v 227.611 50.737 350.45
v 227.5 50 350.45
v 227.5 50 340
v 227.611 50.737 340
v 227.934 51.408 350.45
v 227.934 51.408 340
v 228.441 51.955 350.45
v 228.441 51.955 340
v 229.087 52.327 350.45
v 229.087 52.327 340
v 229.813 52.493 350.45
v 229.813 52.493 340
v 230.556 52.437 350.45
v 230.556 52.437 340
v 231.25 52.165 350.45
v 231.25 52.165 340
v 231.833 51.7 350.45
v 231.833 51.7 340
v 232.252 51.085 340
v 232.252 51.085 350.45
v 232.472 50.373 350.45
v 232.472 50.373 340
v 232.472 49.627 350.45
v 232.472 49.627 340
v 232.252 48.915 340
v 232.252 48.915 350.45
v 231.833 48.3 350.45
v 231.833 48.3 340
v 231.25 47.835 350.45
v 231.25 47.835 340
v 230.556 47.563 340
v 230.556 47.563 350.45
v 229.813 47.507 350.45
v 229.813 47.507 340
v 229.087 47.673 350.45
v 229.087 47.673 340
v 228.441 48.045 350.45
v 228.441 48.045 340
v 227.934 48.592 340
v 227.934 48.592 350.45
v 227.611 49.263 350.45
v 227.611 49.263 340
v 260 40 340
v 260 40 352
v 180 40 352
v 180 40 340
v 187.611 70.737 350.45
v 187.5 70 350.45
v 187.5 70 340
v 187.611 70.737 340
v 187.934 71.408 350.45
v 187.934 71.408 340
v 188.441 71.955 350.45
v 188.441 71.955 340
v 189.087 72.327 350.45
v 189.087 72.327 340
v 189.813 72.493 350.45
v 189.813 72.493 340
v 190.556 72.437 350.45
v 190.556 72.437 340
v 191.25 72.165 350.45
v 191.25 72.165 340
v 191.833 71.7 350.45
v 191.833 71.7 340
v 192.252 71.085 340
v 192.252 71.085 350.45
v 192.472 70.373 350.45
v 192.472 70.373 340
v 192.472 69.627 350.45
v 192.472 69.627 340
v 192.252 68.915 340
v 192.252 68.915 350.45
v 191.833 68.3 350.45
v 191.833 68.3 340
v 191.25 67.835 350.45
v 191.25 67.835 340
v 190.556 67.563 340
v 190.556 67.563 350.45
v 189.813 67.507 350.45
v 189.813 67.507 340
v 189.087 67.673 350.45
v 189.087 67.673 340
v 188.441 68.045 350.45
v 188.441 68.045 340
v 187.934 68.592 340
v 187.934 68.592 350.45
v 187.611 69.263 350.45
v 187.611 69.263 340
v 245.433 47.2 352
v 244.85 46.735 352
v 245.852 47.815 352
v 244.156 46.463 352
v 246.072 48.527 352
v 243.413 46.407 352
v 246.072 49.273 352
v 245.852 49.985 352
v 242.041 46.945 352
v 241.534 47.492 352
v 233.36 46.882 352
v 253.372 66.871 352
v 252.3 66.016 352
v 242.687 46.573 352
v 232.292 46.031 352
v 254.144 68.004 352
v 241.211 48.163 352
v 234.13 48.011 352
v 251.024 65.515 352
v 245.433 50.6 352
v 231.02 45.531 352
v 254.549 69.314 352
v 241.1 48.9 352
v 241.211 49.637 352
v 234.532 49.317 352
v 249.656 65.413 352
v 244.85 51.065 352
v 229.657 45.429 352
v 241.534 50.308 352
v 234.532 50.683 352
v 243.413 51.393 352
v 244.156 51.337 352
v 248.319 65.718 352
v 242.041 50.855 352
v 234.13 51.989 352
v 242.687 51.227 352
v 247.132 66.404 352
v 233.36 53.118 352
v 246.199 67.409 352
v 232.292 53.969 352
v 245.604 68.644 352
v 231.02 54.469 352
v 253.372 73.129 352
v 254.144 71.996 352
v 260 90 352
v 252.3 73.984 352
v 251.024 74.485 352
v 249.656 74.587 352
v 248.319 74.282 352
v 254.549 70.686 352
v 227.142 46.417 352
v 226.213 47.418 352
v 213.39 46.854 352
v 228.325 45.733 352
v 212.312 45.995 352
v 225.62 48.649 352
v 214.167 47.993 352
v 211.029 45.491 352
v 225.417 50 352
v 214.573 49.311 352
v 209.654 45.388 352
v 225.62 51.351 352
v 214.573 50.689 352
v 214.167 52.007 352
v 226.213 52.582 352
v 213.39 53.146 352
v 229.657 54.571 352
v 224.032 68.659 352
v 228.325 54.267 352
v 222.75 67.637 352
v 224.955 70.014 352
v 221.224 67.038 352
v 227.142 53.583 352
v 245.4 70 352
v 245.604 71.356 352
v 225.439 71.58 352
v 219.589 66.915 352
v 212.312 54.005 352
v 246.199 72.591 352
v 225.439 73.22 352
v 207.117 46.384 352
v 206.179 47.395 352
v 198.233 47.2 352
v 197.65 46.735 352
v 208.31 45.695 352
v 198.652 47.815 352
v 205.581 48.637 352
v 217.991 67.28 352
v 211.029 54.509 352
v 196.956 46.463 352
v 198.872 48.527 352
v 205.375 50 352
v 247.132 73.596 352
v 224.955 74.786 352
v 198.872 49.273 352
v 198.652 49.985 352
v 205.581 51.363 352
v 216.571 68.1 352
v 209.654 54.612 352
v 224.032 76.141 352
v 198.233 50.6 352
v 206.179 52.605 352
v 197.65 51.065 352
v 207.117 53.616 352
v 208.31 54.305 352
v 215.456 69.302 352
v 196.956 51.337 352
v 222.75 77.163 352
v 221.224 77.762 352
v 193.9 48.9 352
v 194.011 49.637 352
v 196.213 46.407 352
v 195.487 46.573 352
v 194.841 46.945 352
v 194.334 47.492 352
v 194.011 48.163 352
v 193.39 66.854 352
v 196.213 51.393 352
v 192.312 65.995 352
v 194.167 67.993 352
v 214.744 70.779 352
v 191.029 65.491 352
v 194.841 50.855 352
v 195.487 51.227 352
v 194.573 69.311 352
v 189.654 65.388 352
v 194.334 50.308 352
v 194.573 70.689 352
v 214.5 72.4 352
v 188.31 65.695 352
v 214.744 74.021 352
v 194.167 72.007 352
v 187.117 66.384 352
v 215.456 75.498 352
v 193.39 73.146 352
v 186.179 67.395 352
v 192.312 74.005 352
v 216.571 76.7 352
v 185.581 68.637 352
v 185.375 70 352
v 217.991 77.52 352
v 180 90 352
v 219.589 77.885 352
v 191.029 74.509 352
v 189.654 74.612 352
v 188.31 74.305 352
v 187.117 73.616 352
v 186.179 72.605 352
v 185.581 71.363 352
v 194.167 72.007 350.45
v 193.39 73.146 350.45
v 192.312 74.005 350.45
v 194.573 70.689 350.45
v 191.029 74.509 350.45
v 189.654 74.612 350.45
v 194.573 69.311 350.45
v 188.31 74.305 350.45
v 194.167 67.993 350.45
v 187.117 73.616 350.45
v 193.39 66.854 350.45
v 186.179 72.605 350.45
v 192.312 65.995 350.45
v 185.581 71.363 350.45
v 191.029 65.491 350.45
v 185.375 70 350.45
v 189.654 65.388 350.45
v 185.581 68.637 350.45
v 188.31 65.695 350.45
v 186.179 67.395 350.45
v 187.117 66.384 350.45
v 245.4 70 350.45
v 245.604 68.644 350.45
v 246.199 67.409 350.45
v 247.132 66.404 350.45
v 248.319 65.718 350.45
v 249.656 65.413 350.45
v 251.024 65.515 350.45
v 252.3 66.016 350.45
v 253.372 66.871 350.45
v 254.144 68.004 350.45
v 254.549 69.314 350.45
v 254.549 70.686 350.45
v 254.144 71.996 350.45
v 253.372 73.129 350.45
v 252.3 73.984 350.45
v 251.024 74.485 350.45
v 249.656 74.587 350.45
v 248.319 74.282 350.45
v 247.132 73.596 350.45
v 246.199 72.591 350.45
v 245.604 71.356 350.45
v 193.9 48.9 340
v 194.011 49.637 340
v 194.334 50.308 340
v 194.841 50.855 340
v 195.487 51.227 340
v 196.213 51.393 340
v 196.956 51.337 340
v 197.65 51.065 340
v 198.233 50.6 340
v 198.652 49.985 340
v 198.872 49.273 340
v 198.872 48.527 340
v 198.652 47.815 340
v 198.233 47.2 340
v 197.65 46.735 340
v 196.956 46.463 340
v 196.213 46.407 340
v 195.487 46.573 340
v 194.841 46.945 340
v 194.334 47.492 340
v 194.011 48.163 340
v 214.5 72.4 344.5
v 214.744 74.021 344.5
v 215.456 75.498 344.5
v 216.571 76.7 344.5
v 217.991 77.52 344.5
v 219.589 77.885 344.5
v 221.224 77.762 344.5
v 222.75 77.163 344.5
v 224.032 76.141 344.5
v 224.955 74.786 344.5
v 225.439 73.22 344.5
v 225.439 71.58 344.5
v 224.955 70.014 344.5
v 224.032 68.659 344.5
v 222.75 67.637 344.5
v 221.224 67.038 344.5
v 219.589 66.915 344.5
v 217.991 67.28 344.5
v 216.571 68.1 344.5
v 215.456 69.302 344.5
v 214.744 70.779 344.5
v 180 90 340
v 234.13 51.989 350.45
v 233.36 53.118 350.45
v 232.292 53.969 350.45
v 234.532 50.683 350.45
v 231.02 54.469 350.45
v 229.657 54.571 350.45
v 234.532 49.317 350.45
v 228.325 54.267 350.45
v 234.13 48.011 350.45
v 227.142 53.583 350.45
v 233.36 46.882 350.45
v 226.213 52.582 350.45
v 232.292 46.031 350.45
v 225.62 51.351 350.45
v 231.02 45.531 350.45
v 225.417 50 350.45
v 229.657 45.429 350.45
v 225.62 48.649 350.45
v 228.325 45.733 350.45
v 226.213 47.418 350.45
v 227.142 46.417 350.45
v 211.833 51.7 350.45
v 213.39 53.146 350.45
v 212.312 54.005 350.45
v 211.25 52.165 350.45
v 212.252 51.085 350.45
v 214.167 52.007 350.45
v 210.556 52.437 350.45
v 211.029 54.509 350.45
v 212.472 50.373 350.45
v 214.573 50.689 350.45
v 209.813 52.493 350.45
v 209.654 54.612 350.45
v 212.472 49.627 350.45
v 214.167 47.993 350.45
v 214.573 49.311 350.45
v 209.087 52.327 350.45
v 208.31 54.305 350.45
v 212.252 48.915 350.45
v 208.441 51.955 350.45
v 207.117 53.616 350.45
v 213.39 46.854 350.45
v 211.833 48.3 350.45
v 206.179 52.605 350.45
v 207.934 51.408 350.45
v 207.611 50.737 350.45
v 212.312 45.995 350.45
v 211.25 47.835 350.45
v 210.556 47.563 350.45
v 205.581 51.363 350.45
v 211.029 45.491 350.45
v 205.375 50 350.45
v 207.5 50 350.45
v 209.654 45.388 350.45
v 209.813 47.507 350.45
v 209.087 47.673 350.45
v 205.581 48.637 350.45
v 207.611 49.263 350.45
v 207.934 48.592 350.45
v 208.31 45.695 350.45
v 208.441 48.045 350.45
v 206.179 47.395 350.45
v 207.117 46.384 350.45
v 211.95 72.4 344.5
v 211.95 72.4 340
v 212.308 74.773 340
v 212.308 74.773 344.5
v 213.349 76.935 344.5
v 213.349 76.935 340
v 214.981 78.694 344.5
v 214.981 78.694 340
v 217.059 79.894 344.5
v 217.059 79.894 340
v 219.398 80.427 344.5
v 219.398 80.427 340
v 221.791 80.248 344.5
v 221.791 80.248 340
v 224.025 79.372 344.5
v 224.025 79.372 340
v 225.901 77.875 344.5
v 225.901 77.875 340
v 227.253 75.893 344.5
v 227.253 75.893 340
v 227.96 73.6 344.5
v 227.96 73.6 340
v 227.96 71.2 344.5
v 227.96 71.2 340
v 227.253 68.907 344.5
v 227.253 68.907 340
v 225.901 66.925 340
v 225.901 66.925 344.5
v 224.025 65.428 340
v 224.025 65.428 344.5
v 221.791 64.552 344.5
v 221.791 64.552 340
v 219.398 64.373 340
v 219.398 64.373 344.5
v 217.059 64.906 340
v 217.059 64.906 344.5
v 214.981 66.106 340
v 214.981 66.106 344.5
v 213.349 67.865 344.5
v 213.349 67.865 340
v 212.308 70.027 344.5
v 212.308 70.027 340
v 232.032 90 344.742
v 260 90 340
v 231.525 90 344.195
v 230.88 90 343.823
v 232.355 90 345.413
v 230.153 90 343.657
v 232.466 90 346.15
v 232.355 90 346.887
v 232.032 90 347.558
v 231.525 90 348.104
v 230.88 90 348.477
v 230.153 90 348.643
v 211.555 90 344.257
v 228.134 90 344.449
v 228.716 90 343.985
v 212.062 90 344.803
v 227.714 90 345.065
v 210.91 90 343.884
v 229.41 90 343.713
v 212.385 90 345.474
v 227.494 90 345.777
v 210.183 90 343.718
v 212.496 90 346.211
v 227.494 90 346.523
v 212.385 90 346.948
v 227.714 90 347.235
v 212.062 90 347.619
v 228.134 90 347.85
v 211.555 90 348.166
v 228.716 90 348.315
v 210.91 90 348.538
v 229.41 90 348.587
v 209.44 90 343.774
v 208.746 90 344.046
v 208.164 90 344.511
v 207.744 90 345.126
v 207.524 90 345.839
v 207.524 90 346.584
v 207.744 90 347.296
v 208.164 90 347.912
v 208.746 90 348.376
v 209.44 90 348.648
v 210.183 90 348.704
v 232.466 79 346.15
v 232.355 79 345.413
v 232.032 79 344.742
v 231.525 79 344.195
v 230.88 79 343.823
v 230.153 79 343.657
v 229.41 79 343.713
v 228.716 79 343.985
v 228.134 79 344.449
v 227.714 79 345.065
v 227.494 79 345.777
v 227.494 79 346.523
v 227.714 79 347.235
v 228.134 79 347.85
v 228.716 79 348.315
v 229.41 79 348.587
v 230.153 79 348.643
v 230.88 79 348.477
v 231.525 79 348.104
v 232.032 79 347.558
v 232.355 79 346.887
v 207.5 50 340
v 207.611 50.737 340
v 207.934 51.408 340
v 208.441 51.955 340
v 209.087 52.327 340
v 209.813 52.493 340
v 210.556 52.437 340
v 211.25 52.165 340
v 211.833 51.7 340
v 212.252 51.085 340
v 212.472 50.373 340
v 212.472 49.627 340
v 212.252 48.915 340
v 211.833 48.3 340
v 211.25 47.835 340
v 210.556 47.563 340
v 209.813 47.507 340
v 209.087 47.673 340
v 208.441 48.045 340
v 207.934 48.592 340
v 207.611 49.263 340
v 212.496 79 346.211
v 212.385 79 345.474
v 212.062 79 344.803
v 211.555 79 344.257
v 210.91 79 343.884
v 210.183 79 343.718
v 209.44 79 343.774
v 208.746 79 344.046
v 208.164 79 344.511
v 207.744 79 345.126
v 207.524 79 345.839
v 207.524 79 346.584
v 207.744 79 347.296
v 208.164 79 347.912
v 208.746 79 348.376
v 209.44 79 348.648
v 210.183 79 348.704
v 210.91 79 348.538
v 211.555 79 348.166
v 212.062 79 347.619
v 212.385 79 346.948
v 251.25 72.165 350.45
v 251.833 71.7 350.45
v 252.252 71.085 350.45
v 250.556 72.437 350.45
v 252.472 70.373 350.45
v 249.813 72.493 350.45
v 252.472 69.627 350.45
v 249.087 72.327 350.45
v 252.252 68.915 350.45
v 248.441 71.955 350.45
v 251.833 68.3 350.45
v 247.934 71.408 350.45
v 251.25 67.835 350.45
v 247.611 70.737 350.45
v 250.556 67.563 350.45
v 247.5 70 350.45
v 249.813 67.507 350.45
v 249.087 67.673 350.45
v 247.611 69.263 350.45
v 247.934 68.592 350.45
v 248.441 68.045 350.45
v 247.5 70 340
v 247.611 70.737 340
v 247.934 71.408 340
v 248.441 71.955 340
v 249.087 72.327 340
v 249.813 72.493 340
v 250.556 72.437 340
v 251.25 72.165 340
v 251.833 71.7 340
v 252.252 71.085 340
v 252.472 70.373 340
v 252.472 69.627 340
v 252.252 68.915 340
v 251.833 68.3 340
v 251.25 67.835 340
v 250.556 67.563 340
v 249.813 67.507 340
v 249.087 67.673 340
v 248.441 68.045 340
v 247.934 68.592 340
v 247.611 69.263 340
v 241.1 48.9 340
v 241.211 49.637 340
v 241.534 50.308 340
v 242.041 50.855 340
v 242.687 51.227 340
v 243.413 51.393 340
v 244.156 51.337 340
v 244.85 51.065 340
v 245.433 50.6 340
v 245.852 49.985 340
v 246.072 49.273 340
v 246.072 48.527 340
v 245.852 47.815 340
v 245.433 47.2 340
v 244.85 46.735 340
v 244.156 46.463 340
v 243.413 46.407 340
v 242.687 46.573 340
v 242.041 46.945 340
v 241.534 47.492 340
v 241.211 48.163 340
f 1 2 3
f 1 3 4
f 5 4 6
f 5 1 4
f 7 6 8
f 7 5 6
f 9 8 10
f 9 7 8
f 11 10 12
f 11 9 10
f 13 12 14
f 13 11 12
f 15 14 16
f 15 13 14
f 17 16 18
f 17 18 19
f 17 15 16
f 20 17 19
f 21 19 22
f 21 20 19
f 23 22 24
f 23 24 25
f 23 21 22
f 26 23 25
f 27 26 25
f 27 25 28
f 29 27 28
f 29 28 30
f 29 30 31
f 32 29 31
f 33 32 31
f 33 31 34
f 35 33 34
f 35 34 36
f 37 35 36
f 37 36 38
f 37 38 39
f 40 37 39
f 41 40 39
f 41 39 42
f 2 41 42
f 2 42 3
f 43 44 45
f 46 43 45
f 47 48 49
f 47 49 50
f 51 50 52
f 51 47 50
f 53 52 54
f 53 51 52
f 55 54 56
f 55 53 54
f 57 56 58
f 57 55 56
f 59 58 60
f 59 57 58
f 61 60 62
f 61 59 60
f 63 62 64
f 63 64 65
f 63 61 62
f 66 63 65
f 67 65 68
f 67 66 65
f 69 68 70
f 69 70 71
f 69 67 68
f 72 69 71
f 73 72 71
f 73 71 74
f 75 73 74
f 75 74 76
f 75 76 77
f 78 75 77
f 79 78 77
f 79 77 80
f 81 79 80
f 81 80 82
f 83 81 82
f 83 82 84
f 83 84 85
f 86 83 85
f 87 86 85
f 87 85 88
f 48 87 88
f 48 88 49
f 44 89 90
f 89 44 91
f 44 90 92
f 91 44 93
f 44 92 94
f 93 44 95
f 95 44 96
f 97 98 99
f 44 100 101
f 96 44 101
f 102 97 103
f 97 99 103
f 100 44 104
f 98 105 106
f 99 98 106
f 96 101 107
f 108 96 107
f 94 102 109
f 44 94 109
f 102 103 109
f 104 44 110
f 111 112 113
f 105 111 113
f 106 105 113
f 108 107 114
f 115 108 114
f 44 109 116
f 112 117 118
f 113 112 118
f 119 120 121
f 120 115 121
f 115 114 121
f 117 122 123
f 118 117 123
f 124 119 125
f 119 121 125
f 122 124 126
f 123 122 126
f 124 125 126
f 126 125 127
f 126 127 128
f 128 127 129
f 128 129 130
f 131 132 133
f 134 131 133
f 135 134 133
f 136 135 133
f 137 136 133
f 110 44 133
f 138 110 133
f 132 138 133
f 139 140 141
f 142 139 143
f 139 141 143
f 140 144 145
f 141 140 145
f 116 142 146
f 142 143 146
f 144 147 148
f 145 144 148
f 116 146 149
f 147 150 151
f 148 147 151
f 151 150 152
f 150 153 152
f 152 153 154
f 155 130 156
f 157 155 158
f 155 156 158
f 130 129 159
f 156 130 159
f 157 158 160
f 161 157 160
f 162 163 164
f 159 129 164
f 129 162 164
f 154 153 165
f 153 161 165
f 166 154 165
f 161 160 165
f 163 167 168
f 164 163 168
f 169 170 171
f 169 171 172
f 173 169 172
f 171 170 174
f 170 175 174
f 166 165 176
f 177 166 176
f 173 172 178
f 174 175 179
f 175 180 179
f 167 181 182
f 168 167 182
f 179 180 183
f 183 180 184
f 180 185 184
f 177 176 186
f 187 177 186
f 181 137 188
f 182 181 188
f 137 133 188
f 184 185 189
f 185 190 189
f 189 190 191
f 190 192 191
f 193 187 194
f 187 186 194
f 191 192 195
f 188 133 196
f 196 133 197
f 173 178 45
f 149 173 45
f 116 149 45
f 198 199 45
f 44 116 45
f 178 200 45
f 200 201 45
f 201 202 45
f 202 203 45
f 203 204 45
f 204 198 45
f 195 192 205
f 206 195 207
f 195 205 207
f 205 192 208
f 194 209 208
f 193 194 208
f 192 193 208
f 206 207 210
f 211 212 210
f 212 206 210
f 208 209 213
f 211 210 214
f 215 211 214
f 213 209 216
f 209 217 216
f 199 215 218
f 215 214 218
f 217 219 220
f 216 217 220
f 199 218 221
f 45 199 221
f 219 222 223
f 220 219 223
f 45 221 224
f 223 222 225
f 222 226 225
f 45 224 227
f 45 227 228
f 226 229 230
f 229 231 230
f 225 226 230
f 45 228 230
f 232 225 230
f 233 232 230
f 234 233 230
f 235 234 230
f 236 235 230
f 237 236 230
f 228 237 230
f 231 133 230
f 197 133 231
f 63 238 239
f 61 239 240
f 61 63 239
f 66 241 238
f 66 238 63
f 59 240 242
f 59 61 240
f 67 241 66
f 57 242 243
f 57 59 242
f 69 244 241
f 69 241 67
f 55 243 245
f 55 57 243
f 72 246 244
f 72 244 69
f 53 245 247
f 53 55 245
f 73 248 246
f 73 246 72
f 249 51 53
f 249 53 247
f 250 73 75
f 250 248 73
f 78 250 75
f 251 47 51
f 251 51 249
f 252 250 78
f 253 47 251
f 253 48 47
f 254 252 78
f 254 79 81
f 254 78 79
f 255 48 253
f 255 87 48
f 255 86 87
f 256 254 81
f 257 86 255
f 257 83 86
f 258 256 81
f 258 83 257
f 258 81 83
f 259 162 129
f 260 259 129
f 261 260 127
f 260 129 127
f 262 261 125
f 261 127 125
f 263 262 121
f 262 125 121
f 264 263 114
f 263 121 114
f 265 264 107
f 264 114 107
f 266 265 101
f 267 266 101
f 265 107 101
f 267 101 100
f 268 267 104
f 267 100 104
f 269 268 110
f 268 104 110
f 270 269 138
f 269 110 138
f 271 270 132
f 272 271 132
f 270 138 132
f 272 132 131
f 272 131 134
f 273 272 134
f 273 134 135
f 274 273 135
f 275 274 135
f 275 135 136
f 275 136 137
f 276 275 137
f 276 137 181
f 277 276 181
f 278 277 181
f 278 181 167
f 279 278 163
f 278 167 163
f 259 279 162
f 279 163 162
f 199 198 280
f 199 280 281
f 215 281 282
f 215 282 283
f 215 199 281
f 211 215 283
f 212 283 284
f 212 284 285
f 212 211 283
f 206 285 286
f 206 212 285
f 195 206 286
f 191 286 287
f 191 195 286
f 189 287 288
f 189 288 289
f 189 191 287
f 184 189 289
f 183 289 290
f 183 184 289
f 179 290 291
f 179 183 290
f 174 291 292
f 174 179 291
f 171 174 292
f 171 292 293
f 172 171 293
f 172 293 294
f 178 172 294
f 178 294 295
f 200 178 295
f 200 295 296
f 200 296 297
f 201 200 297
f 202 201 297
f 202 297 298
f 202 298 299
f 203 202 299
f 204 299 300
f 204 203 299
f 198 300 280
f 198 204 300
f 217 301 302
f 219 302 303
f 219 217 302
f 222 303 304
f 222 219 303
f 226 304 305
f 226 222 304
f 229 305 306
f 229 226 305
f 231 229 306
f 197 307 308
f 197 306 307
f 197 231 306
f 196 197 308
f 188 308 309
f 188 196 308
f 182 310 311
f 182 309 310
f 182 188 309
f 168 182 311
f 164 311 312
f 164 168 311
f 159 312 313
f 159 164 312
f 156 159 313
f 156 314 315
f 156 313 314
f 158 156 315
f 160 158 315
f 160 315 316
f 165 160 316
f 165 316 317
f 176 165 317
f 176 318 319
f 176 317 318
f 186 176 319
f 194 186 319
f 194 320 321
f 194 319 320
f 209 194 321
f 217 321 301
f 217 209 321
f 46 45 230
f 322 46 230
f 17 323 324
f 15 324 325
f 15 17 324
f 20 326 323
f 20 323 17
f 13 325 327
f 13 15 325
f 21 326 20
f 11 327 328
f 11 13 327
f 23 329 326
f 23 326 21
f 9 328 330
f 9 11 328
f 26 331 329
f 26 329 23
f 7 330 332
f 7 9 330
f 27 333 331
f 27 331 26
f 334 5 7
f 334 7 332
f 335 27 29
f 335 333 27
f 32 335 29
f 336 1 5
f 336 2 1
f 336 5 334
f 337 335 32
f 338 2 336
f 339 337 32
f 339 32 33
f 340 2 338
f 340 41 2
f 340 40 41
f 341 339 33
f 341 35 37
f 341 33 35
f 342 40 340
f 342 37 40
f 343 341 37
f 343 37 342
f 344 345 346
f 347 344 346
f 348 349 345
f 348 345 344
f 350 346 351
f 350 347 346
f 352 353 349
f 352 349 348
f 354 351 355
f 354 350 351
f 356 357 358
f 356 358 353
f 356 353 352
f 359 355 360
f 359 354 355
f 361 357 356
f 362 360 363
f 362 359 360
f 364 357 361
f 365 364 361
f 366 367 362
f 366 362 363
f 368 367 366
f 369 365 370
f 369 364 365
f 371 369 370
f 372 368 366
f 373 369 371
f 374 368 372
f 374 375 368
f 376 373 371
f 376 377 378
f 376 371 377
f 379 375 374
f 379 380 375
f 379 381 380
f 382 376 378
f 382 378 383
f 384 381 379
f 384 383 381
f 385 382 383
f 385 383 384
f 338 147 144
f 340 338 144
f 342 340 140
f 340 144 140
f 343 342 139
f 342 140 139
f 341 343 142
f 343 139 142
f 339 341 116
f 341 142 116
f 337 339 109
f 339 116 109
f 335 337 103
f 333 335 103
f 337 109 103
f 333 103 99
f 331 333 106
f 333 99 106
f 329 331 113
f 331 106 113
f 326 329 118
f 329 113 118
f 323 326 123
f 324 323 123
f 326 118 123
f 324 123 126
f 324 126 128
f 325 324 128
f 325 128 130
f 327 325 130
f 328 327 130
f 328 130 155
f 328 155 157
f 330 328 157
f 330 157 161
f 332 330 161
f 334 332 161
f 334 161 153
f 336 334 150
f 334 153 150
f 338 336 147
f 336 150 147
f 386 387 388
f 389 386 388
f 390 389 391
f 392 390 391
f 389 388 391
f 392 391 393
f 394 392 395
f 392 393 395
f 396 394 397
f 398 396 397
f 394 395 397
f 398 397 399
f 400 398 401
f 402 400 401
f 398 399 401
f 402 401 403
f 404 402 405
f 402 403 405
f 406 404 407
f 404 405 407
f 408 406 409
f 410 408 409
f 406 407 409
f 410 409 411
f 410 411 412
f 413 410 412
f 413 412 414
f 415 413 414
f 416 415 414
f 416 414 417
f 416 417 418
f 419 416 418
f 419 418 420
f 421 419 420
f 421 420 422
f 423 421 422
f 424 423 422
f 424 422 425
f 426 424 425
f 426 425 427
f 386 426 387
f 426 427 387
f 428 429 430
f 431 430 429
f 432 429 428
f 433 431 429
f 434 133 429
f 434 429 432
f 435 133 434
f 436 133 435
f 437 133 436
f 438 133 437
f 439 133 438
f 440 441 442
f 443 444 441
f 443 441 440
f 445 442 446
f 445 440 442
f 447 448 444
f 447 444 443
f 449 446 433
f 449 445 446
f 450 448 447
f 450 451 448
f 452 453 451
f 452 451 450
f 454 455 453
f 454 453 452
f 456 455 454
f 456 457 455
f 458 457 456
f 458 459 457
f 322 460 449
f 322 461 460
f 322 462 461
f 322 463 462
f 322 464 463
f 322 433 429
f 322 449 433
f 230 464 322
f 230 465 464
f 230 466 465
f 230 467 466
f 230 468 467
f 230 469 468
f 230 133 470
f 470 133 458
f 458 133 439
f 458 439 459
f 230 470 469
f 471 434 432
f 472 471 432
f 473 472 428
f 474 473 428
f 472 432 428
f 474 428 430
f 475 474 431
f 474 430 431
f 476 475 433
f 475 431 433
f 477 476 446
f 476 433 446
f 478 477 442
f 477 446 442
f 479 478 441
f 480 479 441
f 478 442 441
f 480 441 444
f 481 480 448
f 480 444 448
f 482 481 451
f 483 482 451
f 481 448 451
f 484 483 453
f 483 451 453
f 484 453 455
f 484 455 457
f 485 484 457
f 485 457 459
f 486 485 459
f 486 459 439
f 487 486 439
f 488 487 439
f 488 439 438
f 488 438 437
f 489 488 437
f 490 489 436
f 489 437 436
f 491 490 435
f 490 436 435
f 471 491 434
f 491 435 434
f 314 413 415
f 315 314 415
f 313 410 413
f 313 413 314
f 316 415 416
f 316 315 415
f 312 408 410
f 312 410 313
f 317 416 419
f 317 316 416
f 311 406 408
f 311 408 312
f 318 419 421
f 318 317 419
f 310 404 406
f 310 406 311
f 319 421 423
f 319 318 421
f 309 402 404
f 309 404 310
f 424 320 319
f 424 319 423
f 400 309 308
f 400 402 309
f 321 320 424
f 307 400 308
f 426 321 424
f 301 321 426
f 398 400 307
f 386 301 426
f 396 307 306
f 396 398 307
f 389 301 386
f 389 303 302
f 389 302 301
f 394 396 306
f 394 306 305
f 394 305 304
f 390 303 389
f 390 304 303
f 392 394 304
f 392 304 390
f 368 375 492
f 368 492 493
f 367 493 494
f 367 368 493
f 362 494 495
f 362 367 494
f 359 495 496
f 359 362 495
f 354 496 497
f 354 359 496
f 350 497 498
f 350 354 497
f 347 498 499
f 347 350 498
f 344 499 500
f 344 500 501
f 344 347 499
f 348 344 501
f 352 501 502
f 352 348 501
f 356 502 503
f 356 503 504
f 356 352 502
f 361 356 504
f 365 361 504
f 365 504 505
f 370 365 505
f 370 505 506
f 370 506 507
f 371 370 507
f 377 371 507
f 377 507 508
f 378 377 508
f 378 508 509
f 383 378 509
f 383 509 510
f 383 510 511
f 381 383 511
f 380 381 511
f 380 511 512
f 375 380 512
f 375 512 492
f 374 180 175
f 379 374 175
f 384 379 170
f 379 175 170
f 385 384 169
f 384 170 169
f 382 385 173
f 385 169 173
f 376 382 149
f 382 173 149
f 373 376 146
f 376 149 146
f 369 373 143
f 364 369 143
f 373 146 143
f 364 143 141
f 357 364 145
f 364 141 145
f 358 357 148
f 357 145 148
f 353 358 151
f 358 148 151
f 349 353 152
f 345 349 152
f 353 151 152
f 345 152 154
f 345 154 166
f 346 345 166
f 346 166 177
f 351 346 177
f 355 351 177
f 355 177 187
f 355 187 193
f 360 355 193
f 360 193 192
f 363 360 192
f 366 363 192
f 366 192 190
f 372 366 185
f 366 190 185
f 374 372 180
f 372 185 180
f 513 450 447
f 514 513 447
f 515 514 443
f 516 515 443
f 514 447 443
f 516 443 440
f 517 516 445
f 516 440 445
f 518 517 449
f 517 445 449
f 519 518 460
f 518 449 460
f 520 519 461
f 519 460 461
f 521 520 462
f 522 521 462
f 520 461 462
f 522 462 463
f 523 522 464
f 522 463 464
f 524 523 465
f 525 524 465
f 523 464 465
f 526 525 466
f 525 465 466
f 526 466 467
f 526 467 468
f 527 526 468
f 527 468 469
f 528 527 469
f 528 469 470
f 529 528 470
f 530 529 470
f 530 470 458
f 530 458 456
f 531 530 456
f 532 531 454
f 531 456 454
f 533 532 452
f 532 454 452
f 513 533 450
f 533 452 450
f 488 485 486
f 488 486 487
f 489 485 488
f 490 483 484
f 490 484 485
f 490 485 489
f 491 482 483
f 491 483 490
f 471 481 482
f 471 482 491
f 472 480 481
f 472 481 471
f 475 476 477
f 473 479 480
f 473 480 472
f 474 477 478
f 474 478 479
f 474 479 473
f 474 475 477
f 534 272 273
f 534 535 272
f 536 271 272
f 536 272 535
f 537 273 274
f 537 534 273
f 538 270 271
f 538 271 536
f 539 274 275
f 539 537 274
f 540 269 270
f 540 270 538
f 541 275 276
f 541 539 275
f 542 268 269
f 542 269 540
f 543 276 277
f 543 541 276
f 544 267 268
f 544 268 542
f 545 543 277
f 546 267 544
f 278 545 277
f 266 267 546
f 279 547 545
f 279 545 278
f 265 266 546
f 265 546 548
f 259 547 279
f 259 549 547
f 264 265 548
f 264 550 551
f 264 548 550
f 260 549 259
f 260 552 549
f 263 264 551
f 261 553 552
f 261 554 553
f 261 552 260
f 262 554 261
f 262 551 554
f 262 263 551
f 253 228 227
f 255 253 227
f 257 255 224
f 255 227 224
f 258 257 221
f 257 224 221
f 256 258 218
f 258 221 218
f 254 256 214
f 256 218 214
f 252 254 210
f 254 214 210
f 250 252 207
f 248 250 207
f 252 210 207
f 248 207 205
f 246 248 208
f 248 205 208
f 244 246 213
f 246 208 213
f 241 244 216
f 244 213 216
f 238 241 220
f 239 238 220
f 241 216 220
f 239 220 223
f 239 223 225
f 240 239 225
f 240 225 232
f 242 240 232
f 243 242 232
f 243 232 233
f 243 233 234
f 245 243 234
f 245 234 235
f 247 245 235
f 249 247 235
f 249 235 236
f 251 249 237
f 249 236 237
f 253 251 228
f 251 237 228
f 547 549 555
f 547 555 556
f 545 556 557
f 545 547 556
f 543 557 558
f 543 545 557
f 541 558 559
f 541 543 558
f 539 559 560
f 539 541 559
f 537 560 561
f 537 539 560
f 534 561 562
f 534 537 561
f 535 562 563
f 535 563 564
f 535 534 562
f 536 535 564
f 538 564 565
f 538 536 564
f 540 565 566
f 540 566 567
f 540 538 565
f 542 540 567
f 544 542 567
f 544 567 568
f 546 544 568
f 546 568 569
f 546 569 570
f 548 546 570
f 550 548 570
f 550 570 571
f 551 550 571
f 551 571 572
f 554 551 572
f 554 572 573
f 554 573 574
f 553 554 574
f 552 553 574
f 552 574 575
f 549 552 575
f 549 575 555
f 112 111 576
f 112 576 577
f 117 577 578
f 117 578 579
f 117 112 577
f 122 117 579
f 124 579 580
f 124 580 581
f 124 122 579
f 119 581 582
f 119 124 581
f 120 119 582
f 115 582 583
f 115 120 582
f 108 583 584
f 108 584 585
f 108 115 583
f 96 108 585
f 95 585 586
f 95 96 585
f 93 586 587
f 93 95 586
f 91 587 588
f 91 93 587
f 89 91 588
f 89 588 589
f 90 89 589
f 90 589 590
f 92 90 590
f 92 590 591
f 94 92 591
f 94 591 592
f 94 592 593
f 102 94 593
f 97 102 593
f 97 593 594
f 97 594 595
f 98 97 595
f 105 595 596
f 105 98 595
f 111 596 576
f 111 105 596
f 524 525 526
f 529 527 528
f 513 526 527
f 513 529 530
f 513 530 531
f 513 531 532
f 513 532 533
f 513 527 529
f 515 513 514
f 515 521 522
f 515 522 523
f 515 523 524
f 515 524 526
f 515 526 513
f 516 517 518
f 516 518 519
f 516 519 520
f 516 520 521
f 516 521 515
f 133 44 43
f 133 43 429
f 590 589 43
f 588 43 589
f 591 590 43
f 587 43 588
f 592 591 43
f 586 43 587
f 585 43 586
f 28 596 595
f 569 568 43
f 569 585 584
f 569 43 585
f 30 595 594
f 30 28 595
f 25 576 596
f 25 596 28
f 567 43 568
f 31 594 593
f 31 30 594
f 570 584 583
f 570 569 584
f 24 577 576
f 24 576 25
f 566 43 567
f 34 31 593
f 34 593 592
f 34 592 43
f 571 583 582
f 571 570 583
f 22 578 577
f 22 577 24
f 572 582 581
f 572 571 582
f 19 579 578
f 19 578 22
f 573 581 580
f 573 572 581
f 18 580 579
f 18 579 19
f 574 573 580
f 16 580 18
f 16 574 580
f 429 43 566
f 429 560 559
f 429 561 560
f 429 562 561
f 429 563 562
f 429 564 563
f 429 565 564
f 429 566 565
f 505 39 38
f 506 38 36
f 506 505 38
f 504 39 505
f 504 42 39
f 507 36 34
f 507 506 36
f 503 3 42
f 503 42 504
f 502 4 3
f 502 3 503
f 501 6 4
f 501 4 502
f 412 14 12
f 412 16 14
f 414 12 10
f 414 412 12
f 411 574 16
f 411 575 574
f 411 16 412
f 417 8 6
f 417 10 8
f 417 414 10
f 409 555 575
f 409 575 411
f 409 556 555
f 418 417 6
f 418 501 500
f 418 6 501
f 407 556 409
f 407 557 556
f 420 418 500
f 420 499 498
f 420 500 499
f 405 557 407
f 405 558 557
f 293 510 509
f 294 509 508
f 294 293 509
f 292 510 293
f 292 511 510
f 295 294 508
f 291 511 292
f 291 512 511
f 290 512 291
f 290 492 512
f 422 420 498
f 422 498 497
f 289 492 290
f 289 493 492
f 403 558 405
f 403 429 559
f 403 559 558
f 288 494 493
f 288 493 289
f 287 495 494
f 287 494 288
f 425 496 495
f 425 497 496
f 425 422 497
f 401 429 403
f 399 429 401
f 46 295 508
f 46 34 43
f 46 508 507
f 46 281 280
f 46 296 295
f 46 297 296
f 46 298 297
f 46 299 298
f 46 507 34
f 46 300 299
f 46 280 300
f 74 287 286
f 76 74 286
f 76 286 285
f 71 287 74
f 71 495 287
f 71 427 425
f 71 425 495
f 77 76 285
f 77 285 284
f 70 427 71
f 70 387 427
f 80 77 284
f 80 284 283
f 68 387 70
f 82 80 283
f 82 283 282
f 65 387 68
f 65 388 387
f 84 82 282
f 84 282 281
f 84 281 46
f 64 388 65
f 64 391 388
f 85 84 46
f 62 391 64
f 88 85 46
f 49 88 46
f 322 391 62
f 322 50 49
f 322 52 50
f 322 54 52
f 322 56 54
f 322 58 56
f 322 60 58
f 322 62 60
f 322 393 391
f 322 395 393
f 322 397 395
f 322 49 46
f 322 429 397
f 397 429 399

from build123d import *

# Parameters (mm, degrees)
SKETCH120_W     = 80
SKETCH120_H     = 50
SKETCH120_R     = 2.5
SKETCH120_R_2   = 5.5
PAD038_DEPTH    = 12
SKETCH121_R     = 2.5
POCKET077_DEPTH = 11
SKETCH122_R     = 8.05
POCKET078_DEPTH = 4.5
SKETCH123_R     = 4.6
SKETCH123_R_2   = 4.624594
SKETCH123_R_3   = 4.583454
SKETCH123_R_4   = 4.624604
POCKET079_DEPTH = 1.55


with BuildPart() as part:
    # Sketch120 → Pad038 (new body)
    with BuildSketch(Plane(origin=(260, 40, 352), x_dir=(-1, 0, 0), z_dir=(0, 0, -1))):
        with Locations((40, 25)):
            Rectangle(SKETCH120_W, SKETCH120_H)
        with Locations((10, 30)):
            Circle(SKETCH120_R, mode=Mode.SUBTRACT)
        with Locations((30, 10)):
            Circle(SKETCH120_R, mode=Mode.SUBTRACT)
        with Locations((16.4, 8.9)):
            Circle(SKETCH120_R, mode=Mode.SUBTRACT)
        with Locations((50, 10)):
            Circle(SKETCH120_R, mode=Mode.SUBTRACT)
        with Locations((63.6, 8.9)):
            Circle(SKETCH120_R, mode=Mode.SUBTRACT)
        with Locations((70, 30)):
            Circle(SKETCH120_R, mode=Mode.SUBTRACT)
        with Locations((40, 32.4)):
            Circle(SKETCH120_R_2, mode=Mode.SUBTRACT)
    extrude(amount=PAD038_DEPTH)

    # Sketch121 → Pocket077 (cut)
    with BuildSketch(Plane(origin=(260, 90, 352), x_dir=(1, 0, 0), z_dir=(0, 1, 0))):
        with Locations((-30.033846, 5.850095)):
            Circle(SKETCH121_R)
        with Locations((-50.003807, 5.788844)):
            Circle(SKETCH121_R)
    extrude(amount=-POCKET077_DEPTH, mode=Mode.SUBTRACT)

    # Sketch122 → Pocket078 (cut)
    with BuildSketch(Plane(origin=(260, 40, 340), x_dir=(-1, 0, 0), z_dir=(0, 0, -1))):
        with Locations((40, 32.4)):
            Circle(SKETCH122_R)
    extrude(amount=-POCKET078_DEPTH, mode=Mode.SUBTRACT)

    # Sketch123 → Pocket079 (cut)
    with BuildSketch(Plane(origin=(260, 40, 352), x_dir=(-1, 0, 0), z_dir=(0, 0, 1))):
        with Locations((10, -30)):
            Circle(SKETCH123_R)
        with Locations((70, -30)):
            Circle(SKETCH123_R_2)
        with Locations((30, -10)):
            Circle(SKETCH123_R_3)
        with Locations((50, -10)):
            Circle(SKETCH123_R_4)
    extrude(amount=-POCKET079_DEPTH, mode=Mode.SUBTRACT)


solid = part.part
